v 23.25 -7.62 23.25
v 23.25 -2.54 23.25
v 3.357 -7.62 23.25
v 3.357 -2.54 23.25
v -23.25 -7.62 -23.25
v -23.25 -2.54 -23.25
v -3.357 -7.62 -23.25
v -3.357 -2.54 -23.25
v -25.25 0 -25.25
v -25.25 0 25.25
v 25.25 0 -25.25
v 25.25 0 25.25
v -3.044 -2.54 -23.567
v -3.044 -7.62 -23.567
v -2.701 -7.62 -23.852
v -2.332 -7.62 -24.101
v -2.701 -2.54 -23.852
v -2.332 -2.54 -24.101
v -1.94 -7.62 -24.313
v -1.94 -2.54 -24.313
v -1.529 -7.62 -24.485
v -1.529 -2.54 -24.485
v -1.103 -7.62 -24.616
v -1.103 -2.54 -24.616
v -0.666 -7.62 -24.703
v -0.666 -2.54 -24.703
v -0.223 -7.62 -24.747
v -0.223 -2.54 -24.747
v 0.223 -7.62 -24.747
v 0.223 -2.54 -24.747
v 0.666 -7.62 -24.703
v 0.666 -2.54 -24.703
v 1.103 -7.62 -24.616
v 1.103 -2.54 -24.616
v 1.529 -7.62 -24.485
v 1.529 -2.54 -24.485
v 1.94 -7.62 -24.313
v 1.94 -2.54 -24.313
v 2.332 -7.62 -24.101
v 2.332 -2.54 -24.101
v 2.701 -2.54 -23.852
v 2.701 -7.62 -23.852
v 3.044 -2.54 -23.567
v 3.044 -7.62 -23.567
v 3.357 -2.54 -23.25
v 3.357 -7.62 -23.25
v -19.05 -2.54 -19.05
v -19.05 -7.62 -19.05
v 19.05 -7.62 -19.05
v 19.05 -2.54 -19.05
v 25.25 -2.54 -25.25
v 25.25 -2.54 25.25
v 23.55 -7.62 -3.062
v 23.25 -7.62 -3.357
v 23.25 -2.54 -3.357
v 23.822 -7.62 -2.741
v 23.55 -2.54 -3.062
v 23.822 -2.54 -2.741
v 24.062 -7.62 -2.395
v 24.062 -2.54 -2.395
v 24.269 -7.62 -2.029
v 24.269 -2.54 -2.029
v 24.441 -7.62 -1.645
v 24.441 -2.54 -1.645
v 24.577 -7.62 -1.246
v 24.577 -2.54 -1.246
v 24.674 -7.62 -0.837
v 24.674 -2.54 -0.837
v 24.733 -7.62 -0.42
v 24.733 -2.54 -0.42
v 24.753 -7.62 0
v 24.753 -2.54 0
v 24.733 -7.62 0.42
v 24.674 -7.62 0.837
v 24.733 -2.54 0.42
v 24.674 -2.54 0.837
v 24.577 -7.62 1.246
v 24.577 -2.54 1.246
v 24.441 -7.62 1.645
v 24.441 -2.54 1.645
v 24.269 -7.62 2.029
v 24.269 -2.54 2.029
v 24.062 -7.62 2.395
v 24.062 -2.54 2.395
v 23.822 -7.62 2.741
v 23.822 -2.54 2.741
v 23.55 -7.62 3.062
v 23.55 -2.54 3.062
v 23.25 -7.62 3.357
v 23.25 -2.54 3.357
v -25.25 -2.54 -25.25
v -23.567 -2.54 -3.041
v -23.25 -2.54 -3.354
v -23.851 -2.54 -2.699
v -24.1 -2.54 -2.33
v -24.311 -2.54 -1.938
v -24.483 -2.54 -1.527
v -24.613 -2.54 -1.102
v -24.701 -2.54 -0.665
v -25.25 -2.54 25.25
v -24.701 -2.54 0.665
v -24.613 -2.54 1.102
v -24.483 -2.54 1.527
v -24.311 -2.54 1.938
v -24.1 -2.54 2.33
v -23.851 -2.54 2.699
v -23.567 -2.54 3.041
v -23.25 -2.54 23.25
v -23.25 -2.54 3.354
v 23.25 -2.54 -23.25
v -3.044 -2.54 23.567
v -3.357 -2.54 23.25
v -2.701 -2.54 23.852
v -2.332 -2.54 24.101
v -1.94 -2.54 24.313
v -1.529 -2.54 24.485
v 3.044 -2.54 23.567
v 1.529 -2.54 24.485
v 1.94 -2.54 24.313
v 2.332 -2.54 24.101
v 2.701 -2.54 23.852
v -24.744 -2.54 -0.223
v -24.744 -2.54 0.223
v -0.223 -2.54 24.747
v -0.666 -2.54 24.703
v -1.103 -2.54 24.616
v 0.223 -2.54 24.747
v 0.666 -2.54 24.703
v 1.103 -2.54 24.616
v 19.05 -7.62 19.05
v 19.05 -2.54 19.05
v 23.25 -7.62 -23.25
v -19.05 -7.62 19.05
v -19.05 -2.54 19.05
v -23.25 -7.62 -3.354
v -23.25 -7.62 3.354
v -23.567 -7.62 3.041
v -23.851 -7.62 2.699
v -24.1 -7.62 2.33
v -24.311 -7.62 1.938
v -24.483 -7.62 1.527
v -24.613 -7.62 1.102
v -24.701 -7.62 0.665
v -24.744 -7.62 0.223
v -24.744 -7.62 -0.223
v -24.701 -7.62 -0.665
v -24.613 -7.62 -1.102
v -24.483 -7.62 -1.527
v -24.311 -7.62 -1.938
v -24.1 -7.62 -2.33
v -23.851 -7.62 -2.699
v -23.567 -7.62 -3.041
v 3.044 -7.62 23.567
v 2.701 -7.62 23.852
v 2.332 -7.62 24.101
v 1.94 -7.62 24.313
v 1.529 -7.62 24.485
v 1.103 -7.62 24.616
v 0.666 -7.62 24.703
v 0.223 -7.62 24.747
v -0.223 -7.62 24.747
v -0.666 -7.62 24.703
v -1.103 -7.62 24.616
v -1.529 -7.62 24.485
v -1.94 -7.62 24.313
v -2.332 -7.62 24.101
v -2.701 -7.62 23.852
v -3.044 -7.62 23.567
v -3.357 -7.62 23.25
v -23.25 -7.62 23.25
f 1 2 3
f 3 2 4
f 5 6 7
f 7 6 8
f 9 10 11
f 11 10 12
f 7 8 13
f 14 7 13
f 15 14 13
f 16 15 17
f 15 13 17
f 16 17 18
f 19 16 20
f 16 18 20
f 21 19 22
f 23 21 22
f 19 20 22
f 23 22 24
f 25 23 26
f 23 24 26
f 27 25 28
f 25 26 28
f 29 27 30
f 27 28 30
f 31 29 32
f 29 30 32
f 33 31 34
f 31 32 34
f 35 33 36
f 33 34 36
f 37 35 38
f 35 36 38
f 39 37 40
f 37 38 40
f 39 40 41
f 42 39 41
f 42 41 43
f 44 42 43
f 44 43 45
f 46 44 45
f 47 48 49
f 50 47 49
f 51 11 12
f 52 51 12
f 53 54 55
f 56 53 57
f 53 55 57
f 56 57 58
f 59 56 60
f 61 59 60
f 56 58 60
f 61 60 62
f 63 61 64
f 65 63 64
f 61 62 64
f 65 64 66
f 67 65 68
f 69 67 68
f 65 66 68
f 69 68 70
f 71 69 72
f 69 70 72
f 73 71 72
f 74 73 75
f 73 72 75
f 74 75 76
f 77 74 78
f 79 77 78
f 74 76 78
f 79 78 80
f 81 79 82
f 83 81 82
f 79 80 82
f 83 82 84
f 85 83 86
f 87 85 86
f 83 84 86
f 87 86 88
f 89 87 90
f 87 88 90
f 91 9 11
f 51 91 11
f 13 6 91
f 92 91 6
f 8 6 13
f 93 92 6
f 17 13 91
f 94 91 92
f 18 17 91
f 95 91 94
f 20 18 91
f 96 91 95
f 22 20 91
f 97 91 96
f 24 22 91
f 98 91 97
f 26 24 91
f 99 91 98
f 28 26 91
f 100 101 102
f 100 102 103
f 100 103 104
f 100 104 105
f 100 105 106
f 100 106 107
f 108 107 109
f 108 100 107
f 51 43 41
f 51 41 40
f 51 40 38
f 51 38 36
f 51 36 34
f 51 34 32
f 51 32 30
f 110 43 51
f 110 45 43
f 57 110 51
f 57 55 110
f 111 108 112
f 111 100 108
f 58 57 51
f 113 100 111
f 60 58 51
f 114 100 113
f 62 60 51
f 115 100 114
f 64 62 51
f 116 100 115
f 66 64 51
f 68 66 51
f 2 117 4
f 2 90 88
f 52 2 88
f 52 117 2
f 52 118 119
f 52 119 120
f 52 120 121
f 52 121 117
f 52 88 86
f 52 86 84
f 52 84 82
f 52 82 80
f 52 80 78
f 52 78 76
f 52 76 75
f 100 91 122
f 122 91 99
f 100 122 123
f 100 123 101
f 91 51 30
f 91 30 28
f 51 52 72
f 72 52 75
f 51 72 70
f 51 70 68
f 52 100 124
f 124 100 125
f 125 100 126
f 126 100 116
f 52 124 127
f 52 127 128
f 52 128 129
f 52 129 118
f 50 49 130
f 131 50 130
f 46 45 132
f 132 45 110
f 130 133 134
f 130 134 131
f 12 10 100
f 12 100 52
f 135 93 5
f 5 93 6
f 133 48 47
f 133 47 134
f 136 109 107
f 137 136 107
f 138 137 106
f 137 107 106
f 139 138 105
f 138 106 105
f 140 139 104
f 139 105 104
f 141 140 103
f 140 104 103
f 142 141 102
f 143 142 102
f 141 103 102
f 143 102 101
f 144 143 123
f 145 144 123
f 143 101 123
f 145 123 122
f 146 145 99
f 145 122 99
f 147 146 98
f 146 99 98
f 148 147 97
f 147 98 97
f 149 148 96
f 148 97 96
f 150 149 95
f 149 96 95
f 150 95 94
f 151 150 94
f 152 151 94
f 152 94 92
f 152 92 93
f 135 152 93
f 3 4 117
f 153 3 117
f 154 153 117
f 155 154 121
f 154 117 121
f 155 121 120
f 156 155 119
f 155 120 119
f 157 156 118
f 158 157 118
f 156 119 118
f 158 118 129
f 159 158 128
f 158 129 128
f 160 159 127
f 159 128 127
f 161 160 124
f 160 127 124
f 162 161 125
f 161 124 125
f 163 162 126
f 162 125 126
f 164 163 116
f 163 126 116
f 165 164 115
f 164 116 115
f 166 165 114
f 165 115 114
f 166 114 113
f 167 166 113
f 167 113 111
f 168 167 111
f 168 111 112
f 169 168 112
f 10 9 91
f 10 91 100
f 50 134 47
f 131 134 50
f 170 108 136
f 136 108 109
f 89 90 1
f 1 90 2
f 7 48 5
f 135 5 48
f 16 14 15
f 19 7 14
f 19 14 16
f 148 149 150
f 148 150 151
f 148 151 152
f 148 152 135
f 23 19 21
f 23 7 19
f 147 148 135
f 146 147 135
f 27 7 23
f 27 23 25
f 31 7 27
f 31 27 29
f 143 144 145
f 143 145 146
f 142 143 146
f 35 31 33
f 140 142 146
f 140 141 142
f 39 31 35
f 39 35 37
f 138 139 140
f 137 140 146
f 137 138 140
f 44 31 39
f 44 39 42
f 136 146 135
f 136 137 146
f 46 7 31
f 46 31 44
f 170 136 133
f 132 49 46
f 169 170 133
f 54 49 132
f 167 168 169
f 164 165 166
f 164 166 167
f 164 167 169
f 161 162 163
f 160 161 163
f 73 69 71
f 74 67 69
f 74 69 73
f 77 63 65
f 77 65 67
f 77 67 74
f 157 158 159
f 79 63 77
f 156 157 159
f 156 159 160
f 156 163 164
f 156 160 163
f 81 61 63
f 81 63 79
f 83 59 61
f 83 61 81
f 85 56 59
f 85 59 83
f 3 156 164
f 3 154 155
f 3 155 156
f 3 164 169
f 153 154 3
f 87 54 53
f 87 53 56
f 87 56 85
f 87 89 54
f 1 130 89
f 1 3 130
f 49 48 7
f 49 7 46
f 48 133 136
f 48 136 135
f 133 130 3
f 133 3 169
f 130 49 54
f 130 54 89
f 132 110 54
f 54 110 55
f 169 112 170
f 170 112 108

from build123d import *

# Parameters (mm, degrees)
F1_DEPTH = 7.62
F0_W     = 50.5
F0_H     = 50.5
F2_DEPTH = 2.54
F3_W     = 38.1
F3_H     = 38.1
F4_DEPTH = 5.08


# Not quite as in the source:
# - a feature names something its author has since deleted; it is built from what else it names


with BuildPart() as f1:
    # F0 (on Front) → F1 (new body)
    with BuildSketch(Plane.XZ):
        with BuildLine():
            Line((-3.3566042603, 23.25), (-23.25, 23.25))
            Line((-23.25, 23.25), (-23.25, 3.3541019662))
            ThreePointArc((-23.25, 3.3541019662), (-18.4128826929, 4.1079191813), (-15.75, 0))
            ThreePointArc((-15.75, 0), (-18.4128826929, -4.1079191813), (-23.25, -3.3541019662))
            Line((-23.25, -3.3541019662), (-23.25, -23.25))
            Line((-23.25, -23.25), (-3.3566042603, -23.25))
            ThreePointArc((-3.3566042603, -23.25), (-1.6039452654, -16.0483547827), (4.5, -20.2528))
            ThreePointArc((4.5, -20.2528), (4.2044452173, -21.8567452654), (3.3566042603, -23.25))
            Line((3.3566042603, -23.25), (23.25, -23.25))
            Line((23.25, -23.25), (23.25, -3.3566042603))
            ThreePointArc((23.25, -3.3566042603), (15.7528, 0), (23.25, 3.3566042603))
            Line((23.25, 3.3566042603), (23.25, 23.25))
            Line((23.25, 23.25), (3.3566042603, 23.25))
            ThreePointArc((3.3566042603, 23.25), (4.2044452173, 21.8567452654), (4.5, 20.2528))
            ThreePointArc((4.5, 20.2528), (-1.6039452654, 16.0483547827), (-3.3566042603, 23.25))
        make_face()
        with BuildLine():
            ThreePointArc((3.3566042603, 23.25), (0, 24.7528), (-3.3566042603, 23.25))
            Line((-3.3566042603, 23.25), (3.3566042603, 23.25))
        make_face()
        with BuildLine():
            Line((3.3566042603, 23.25), (-3.3566042603, 23.25))
            ThreePointArc((-3.3566042603, 23.25), (-1.6039452654, 16.0483547827), (4.5, 20.2528))
            ThreePointArc((4.5, 20.2528), (4.2044452173, 21.8567452654), (3.3566042603, 23.25))
        make_face()
        with BuildLine():
            ThreePointArc((-15.75, 0), (-18.4128826929, 4.1079191813), (-23.25, 3.3541019662))
            Line((-23.25, 3.3541019662), (-23.25, -3.3541019662))
            ThreePointArc((-23.25, -3.3541019662), (-18.4128826929, -4.1079191813), (-15.75, 0))
        make_face()
        with BuildLine():
            Line((-23.25, -3.3541019662), (-23.25, 3.3541019662))
            ThreePointArc((-23.25, 3.3541019662), (-24.75, 0), (-23.25, -3.3541019662))
        make_face()
        with BuildLine():
            ThreePointArc((4.5, -20.2528), (-1.6039452654, -16.0483547827), (-3.3566042603, -23.25))
            Line((-3.3566042603, -23.25), (3.3566042603, -23.25))
            ThreePointArc((3.3566042603, -23.25), (4.2044452173, -21.8567452654), (4.5, -20.2528))
        make_face()
        with BuildLine():
            Line((3.3566042603, -23.25), (-3.3566042603, -23.25))
            ThreePointArc((-3.3566042603, -23.25), (0, -24.7528), (3.3566042603, -23.25))
        make_face()
        with BuildLine():
            Line((23.25, -3.3566042603), (23.25, 3.3566042603))
            ThreePointArc((23.25, 3.3566042603), (15.7528, 0), (23.25, -3.3566042603))
        make_face()
        with BuildLine():
            ThreePointArc((24.7528, 0), (24.3599522981, 1.8388311505), (23.25, 3.3566042603))
            Line((23.25, 3.3566042603), (23.25, -3.3566042603))
            ThreePointArc((23.25, -3.3566042603), (24.3599522981, -1.8388311505), (24.7528, 0))
        make_face()
    extrude(amount=F1_DEPTH)

    # F0 (on Front) → F2 (join)
    with BuildSketch(Plane.XZ):
        Rectangle(F0_W, F0_H)
        with BuildLine():
            Line((-23.25, 3.3541019662), (-23.25, 23.25))
            Line((-23.25, 23.25), (-3.3566042603, 23.25))
            ThreePointArc((-3.3566042603, 23.25), (0, 24.7528), (3.3566042603, 23.25))
            Line((3.3566042603, 23.25), (23.25, 23.25))
            Line((23.25, 23.25), (23.25, 3.3566042603))
            ThreePointArc((23.25, 3.3566042603), (24.3599522981, 1.8388311505), (24.7528, 0))
            ThreePointArc((24.7528, 0), (24.3599522981, -1.8388311505), (23.25, -3.3566042603))
            Line((23.25, -3.3566042603), (23.25, -23.25))
            Line((23.25, -23.25), (3.3566042603, -23.25))
            ThreePointArc((3.3566042603, -23.25), (0, -24.7528), (-3.3566042603, -23.25))
            Line((-3.3566042603, -23.25), (-23.25, -23.25))
            Line((-23.25, -23.25), (-23.25, -3.3541019662))
            ThreePointArc((-23.25, -3.3541019662), (-24.75, 0), (-23.25, 3.3541019662))
        make_face(mode=Mode.SUBTRACT)
    extrude(amount=F2_DEPTH)

    # F3 (on face) → F4 (cut)
    with BuildSketch(Plane.XZ.offset(7.62)):
        Rectangle(F3_W, F3_H)
    extrude(amount=-F4_DEPTH, mode=Mode.SUBTRACT)


solid = f1.part
